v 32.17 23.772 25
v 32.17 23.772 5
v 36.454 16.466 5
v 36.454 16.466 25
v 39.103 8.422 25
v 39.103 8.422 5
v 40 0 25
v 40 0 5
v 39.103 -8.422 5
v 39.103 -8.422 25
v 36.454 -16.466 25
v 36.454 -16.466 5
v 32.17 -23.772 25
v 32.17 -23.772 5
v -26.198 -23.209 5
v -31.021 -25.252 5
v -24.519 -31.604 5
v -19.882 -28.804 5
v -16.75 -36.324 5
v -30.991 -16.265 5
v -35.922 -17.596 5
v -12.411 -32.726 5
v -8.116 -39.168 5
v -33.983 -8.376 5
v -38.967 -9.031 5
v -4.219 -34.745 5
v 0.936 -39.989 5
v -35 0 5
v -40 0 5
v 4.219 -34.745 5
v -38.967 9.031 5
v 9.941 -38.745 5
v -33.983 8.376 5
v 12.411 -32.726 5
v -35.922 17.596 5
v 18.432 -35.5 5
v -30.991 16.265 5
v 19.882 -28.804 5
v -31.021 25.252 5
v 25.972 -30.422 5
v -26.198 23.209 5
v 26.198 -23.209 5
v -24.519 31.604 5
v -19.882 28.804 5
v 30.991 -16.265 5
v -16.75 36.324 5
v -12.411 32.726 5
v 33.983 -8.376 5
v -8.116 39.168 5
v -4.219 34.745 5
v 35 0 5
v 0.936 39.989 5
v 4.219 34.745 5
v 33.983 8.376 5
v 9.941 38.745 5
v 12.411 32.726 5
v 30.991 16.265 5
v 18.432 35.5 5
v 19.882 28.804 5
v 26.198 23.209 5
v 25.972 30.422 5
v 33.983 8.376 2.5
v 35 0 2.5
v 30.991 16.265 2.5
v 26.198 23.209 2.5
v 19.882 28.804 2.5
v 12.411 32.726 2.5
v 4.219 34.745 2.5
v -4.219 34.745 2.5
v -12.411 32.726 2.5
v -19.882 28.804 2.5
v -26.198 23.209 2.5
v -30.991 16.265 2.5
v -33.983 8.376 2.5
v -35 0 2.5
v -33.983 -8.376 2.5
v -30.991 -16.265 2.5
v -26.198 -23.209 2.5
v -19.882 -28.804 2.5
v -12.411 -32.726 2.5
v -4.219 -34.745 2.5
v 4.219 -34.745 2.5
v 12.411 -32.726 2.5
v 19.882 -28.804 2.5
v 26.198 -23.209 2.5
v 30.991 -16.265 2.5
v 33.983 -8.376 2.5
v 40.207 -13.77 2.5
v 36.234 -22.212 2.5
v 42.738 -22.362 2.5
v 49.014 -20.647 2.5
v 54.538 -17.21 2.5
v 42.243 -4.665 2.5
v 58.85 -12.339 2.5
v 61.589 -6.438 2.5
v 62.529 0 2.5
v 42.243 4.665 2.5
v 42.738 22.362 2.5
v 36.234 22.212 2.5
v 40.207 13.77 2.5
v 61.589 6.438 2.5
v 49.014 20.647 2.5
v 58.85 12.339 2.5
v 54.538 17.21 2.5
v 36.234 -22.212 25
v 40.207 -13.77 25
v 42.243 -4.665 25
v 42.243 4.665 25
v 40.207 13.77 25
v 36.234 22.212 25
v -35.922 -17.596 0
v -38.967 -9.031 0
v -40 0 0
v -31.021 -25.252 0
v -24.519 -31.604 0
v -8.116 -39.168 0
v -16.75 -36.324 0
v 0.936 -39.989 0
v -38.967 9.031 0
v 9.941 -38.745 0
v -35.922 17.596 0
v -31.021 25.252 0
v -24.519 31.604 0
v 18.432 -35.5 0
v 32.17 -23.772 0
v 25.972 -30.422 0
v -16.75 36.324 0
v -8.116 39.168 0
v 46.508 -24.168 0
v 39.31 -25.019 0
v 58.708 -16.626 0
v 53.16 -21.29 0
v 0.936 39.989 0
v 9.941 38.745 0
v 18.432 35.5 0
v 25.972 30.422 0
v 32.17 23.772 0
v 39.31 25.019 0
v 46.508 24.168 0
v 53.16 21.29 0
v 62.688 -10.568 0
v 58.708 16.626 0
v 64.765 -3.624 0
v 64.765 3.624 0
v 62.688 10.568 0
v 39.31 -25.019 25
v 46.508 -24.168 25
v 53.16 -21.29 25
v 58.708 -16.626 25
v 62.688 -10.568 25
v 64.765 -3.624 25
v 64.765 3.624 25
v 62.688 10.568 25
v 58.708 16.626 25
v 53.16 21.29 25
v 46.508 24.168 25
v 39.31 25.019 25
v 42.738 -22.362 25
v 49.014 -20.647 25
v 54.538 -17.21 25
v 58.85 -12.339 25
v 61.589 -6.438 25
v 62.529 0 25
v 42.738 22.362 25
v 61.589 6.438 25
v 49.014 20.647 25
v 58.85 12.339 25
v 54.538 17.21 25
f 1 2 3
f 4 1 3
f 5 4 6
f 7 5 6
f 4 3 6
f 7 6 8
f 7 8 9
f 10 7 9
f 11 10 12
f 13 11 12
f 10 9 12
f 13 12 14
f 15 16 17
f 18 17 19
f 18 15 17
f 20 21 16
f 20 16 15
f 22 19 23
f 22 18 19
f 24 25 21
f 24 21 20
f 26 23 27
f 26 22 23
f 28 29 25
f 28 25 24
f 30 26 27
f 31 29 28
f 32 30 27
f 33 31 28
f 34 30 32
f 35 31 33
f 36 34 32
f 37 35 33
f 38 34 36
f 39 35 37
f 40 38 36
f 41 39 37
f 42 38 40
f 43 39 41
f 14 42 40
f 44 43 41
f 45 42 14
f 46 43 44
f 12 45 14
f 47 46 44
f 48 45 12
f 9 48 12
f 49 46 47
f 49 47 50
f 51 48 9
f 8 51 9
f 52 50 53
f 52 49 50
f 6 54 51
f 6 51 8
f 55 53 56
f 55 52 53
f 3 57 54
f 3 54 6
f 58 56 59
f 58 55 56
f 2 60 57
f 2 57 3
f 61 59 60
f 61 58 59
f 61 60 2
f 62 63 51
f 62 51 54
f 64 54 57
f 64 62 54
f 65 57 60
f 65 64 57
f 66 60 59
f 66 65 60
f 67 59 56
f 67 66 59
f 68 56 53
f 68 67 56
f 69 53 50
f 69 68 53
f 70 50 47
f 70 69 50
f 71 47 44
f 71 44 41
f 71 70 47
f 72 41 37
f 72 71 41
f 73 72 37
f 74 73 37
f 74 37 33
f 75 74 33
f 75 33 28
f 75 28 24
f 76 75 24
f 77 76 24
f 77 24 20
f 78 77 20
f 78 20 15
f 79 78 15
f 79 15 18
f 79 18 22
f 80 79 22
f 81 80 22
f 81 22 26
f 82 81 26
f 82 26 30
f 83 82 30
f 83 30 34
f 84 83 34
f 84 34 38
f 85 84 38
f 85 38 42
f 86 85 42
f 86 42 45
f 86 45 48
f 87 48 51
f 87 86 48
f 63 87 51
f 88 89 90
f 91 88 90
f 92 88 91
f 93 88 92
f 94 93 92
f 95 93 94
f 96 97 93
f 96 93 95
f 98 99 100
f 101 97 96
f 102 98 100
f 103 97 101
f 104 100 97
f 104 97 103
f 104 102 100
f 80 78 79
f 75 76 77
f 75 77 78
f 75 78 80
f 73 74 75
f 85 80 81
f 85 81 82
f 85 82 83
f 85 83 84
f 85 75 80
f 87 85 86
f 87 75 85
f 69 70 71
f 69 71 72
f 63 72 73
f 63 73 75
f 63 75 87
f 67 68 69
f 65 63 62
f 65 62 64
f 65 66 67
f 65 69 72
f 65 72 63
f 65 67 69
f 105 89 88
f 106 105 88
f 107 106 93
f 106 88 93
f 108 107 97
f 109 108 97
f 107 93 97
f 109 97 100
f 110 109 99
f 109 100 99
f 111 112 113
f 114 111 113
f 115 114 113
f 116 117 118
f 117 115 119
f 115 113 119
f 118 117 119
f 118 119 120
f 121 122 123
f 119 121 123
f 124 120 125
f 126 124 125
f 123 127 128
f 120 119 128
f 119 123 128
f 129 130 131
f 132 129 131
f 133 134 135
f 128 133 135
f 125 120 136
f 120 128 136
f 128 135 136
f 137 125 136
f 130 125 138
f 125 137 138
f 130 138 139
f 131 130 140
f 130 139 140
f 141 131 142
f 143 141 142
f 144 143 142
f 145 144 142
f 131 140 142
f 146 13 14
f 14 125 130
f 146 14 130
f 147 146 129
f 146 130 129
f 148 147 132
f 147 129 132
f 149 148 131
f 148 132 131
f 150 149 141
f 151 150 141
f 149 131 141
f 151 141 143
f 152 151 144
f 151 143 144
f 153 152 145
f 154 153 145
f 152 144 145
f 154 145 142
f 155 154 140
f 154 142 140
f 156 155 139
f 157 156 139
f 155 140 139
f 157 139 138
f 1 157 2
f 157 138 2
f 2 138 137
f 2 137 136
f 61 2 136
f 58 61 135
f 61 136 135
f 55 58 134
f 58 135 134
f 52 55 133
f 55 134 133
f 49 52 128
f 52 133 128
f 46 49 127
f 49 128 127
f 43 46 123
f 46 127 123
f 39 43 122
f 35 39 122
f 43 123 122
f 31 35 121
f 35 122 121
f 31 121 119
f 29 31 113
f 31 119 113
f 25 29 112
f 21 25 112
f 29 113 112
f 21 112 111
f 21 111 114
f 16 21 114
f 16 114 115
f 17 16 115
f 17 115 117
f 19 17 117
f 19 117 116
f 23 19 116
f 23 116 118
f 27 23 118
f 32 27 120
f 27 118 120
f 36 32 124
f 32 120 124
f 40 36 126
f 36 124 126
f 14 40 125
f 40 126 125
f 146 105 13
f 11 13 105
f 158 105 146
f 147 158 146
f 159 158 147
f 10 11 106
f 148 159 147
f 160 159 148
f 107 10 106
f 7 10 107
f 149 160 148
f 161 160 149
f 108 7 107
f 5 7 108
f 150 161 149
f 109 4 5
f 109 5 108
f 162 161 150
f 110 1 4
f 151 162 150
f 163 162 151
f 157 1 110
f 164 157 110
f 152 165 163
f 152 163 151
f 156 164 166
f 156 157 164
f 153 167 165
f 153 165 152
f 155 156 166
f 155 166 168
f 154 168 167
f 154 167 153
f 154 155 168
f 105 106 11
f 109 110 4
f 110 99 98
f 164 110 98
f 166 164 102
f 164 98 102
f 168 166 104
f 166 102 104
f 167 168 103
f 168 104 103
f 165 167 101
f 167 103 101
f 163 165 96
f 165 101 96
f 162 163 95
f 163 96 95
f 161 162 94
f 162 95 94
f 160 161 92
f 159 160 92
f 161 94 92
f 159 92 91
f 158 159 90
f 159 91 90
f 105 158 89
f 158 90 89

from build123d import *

# Parameters (mm, degrees)
F1_DEPTH = 25
F0_R     = 35
F2_DEPTH = 5
F3_DEPTH = 2.5
F4_DEPTH = 2.5


with BuildPart() as f1:
    # F0 (on Top) → F1 (new body)
    with BuildSketch(Plane.XY):
        with BuildLine():
            ThreePointArc((32.169506, 23.772314), (37.991974, 12.514387), (40, 0))
            ThreePointArc((40, 0), (37.991974, -12.514387), (32.169506, -23.772314))
            ThreePointArc((32.169506, -23.772314), (65.028774, 0), (32.169506, 23.772314))
        make_face()
        with BuildLine():
            ThreePointArc((36.233804, 22.211741), (62.528774, 0), (36.233804, -22.211741))
            ThreePointArc((36.233804, -22.211741), (42.5, 0), (36.233804, 22.211741))
        make_face(mode=Mode.SUBTRACT)
    extrude(amount=F1_DEPTH)

    # F0 (on Top) → F2 (join)
    with BuildSketch(Plane.XY):
        with BuildLine():
            ThreePointArc((32.169506, -23.772314), (37.991974, -12.514387), (40, 0))
            ThreePointArc((40, 0), (37.991974, 12.514387), (32.169506, 23.772314))
            ThreePointArc((32.169506, 23.772314), (-40, 0), (32.169506, -23.772314))
        make_face()
        Circle(F0_R, mode=Mode.SUBTRACT)
    extrude(amount=F2_DEPTH)

    # F0 (on Top) → F3 (join)
    with BuildSketch(Plane.XY):
        Circle(F0_R)
    extrude(amount=F3_DEPTH)

    # F0 (on Top) → F4 (join)
    with BuildSketch(Plane.XY):
        with BuildLine():
            ThreePointArc((36.233804, 22.211741), (42.5, 0), (36.233804, -22.211741))
            ThreePointArc((36.233804, -22.211741), (62.528774, 0), (36.233804, 22.211741))
        make_face()
    extrude(amount=F4_DEPTH)


solid = f1.part
